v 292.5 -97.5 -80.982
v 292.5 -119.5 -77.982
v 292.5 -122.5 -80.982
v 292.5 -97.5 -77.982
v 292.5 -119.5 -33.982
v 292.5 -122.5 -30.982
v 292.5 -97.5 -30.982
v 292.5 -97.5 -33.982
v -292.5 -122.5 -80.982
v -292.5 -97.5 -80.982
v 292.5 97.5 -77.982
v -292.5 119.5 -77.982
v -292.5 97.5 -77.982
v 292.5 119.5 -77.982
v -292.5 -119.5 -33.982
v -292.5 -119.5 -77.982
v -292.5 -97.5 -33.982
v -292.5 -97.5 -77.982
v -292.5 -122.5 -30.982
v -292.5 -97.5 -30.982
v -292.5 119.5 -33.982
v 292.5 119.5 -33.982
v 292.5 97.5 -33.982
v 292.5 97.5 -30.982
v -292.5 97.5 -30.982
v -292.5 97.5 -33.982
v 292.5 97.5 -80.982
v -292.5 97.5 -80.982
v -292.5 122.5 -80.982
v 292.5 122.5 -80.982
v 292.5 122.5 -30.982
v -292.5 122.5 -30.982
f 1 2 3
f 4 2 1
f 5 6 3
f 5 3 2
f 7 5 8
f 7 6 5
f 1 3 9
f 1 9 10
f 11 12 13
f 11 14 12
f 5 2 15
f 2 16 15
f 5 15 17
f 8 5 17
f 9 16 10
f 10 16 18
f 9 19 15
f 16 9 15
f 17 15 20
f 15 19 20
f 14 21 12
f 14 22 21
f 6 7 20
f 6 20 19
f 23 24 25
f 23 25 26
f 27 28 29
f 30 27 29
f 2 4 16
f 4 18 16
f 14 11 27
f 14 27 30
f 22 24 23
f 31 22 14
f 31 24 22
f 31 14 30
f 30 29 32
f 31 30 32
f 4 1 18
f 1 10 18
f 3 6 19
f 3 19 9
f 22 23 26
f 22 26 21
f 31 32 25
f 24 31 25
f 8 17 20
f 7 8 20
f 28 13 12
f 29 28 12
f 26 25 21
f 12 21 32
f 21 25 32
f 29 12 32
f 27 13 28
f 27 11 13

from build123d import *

# Parameters (mm, degrees)
F1_DEPTH = 292.5


with BuildPart() as f1:
    # F0 (on Right) → F1 (new body, symmetric)
    with BuildSketch(Plane.YZ):
        Polygon((-97.5, -30.981961), (-122.5, -30.981961), (-122.5, -80.981961), (-97.5, -80.981961), (-97.5, -77.981961), (-119.5, -77.981961), (-119.5, -33.981961), (-97.5, -33.981961), align=None)
        Polygon((97.5, -77.981961), (97.5, -80.981961), (122.5, -80.981961), (122.5, -30.981961), (97.5, -30.981961), (97.5, -33.981961), (119.5, -33.981961), (119.5, -77.981961), align=None)
    extrude(amount=F1_DEPTH, both=True)


solid = f1.part
